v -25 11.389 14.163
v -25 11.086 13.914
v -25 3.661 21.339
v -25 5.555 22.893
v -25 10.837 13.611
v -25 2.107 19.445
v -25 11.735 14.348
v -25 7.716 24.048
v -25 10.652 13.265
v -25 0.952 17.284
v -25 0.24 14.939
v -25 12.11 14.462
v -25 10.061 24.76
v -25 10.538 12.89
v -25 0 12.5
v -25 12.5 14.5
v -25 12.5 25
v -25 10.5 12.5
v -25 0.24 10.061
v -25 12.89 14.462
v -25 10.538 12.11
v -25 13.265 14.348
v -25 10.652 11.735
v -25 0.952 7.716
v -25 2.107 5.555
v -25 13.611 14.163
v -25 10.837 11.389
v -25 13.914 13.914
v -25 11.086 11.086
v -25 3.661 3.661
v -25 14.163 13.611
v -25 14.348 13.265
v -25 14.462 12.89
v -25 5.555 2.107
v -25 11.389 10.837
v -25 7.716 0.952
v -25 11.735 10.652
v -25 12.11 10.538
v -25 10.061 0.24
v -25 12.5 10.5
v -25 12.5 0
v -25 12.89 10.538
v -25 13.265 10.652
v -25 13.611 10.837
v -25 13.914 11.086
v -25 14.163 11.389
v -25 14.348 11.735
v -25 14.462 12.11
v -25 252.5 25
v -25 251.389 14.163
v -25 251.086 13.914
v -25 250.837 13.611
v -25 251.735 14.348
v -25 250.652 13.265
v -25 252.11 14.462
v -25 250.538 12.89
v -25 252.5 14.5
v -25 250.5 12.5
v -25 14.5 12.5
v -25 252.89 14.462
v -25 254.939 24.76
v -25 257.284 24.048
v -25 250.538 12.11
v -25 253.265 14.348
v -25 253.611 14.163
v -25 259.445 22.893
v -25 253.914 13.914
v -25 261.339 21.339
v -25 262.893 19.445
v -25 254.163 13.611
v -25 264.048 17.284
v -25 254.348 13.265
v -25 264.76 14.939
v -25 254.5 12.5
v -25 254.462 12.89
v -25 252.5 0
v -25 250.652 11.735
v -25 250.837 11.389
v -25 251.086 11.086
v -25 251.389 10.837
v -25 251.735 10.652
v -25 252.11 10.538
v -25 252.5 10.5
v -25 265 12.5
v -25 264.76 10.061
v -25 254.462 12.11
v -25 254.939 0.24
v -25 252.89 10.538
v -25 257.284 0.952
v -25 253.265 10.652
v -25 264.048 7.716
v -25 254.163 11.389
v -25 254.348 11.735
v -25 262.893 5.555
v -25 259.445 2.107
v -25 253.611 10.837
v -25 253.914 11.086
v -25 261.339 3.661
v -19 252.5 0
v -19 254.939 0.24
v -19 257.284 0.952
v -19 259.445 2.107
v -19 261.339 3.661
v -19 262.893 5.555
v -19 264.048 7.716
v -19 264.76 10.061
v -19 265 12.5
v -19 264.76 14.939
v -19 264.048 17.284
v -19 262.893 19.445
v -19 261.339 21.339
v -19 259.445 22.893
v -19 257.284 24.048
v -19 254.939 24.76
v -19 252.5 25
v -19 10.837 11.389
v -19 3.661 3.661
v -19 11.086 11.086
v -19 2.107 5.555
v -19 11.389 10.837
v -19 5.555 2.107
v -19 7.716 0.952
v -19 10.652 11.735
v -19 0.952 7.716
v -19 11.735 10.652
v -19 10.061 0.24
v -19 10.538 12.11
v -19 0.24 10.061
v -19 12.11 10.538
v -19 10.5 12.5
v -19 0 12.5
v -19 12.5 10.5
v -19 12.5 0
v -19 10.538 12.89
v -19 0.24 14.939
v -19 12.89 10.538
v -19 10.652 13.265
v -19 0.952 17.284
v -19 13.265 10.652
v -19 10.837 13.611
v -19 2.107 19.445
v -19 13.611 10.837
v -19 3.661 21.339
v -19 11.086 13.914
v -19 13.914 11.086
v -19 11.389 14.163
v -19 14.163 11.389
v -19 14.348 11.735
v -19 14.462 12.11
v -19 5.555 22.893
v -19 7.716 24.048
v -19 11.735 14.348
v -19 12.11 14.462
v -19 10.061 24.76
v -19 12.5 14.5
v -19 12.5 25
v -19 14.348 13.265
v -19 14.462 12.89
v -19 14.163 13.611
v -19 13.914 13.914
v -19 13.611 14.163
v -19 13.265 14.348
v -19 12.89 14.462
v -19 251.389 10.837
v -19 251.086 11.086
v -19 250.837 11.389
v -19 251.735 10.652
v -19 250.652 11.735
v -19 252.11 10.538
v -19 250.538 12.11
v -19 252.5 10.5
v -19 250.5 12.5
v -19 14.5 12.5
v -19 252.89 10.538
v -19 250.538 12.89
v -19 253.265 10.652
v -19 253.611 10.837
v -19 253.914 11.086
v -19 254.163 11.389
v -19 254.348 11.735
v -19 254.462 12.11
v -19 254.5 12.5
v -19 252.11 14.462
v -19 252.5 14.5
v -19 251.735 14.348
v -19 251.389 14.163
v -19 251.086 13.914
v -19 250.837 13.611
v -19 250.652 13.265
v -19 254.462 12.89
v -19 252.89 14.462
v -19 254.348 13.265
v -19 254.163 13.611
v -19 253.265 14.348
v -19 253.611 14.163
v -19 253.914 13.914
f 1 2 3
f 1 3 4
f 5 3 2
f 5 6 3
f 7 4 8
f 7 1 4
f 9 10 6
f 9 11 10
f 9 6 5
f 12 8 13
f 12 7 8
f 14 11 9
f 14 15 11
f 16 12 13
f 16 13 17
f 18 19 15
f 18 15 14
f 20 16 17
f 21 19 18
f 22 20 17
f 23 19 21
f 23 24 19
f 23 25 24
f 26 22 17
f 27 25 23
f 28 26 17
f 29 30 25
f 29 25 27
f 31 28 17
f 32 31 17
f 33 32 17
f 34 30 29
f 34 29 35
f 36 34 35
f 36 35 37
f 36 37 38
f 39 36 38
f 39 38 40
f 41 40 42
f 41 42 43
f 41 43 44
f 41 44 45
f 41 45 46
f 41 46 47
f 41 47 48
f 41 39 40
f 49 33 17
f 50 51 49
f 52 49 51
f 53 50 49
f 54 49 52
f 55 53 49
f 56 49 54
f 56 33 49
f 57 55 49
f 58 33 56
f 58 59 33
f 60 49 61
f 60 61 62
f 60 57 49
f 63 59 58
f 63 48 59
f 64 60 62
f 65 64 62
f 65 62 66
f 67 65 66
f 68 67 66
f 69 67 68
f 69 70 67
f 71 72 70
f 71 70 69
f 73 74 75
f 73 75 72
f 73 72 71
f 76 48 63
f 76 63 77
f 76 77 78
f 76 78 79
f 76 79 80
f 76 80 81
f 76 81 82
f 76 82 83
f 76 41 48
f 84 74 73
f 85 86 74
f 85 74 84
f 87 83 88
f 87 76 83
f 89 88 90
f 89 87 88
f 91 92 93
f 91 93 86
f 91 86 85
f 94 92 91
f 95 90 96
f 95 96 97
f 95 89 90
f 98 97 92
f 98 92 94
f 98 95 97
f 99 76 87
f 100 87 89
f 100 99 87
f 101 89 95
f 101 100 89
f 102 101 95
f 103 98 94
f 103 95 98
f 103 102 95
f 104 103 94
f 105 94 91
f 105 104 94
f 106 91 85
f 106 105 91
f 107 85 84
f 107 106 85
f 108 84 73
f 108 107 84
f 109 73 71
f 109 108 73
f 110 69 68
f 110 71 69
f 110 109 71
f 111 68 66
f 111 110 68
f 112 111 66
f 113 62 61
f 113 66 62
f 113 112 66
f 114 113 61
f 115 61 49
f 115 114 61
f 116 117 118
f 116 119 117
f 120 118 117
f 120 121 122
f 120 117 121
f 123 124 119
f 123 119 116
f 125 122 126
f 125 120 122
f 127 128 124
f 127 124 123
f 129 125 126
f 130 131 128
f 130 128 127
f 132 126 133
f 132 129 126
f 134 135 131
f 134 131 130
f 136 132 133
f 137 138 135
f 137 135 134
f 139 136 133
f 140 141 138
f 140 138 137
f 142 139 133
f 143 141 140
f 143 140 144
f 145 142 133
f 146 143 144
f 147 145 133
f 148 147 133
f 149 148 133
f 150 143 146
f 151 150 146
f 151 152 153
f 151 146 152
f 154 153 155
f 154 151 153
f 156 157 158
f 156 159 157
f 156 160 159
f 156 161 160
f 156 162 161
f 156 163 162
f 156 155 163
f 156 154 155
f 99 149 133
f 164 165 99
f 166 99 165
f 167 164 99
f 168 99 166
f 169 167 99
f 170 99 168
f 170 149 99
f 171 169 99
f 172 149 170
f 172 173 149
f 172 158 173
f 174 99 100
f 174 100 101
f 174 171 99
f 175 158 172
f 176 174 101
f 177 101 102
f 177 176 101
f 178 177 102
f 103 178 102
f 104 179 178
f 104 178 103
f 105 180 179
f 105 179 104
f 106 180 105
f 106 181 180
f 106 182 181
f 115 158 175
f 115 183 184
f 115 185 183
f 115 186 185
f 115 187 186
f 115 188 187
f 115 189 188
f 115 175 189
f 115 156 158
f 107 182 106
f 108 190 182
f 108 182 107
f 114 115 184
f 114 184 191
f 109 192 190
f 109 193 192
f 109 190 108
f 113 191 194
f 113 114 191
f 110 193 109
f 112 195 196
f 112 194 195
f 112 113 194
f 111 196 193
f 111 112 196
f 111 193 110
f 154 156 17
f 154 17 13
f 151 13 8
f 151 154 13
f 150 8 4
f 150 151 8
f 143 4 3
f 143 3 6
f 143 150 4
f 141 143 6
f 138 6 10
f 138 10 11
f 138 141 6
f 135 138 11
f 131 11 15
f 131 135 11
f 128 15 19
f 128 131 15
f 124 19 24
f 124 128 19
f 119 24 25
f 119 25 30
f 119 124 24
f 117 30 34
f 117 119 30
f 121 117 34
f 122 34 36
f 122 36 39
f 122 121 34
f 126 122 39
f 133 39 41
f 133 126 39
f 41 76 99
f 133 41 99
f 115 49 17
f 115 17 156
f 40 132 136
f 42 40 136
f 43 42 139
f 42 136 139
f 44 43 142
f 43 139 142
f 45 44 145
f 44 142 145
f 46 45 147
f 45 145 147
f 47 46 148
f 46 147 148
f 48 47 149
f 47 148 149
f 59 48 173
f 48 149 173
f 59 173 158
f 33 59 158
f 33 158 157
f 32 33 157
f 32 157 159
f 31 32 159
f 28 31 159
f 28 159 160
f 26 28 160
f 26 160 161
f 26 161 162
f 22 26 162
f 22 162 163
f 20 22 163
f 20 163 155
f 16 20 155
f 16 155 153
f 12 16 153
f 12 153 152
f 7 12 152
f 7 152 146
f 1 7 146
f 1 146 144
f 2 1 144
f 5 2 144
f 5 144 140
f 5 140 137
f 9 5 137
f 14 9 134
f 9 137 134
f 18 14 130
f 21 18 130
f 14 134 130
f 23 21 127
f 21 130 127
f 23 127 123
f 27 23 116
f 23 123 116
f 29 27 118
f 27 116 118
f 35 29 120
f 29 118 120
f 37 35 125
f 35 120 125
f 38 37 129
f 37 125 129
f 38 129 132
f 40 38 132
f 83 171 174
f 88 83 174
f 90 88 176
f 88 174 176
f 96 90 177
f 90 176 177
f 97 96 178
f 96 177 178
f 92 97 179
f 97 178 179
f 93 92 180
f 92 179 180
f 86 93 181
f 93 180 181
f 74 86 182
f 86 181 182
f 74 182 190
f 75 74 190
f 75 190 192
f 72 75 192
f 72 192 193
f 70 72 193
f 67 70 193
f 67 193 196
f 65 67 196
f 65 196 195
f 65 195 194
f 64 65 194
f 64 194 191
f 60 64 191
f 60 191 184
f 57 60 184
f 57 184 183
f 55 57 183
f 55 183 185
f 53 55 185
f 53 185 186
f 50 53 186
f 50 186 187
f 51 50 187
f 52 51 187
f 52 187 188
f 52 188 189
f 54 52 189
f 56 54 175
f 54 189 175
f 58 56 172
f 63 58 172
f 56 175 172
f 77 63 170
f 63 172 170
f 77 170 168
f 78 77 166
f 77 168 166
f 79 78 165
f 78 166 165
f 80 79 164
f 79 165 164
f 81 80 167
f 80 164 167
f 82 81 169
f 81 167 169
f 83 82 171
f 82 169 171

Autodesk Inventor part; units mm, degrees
ref_plane "YZ Plane" through (0, 0, 0) normal (1, 0, 0) x (0, 1, 0)
ref_plane "XZ Plane" through (0, 0, 0) normal (0, 1, 0) x (-1, 0, 0)
ref_plane "XY Plane" through (0, 0, 0) normal (0, 0, 1) x (1, 0, 0)
sketch "Sketch1" plane through (0, 0, 0) normal (0, 0, 1) x (1, 0, 0)
  line L0 (0, 0) -> (-25, 0)
  line L1 (-25, 0) -> (-25, 265)
  line L2 (-25, 265) -> (0, 265)
  line L3 (0, 265) -> (0, 0)
  dimension "d0" = 265
  dimension "d1" = 25
extrude "Extrusion1" add sketch "Sketch1" along normal blind 25
sketch "Sketch2" plane through (0, 0, 0) normal (1, 0, 0) x (0, 0, -1)
  circle A0 centre (-12.5, 12.5) radius 12.5
  line L0 (0, 0) -> (-25, 0) projected
  circle A1 centre (-12.5, 12.5) radius 2
  circle A2 centre (-12.5, 252.5) radius 12.5
  line L1 (0, 265) -> (-25, 265) projected
  circle A3 centre (-12.5, 252.5) radius 2
  line L2 (0, 0) -> (0, 265) projected
  line L3 (-25, 0) -> (-25, 265) projected
  point P0 (-12.5, 0)
  point P1 (-25, 252.5)
  point P2 (-12.5, 265)
  point P3 (0, 252.5)
  point P4 (-25, 12.5)
  point P5 (-12.5, 0)
  point P6 (0, 12.5)
  dimension "d4" = 25
  dimension "d5" = 12.5
  dimension "d6" = 4
  dimension "d7" = 25
  dimension "d8" = 12.5
  dimension "d9" = 4
  dimension "d10" = 12.5
  dimension "d11" = 12.5
extrude "Extrusion2" cut sketch "Sketch2" against normal blind 25 contours L2 L0 A0 | A0 L0 L3 | A2 L1 L2 | L3 L1 A2 | A1 | A3
sketch "Sketch3" plane through (0, 0, 25) normal (0, 0, 1) x (1, 0, 0)
  line L0 (-25, 265) -> (0, 265) projected
  line L1 (0, 0) -> (-19, 0)
  line L2 (-19, 0) -> (-19, 265)
  line L3 (-19, 265) -> (0, 265)
  line L4 (0, 265) -> (0, 0)
  point P0 (0, 265)
  dimension "d14" = 19
extrude "Extrusion3" cut sketch "Sketch3" against normal blind 100
properties part number "Vertical"
